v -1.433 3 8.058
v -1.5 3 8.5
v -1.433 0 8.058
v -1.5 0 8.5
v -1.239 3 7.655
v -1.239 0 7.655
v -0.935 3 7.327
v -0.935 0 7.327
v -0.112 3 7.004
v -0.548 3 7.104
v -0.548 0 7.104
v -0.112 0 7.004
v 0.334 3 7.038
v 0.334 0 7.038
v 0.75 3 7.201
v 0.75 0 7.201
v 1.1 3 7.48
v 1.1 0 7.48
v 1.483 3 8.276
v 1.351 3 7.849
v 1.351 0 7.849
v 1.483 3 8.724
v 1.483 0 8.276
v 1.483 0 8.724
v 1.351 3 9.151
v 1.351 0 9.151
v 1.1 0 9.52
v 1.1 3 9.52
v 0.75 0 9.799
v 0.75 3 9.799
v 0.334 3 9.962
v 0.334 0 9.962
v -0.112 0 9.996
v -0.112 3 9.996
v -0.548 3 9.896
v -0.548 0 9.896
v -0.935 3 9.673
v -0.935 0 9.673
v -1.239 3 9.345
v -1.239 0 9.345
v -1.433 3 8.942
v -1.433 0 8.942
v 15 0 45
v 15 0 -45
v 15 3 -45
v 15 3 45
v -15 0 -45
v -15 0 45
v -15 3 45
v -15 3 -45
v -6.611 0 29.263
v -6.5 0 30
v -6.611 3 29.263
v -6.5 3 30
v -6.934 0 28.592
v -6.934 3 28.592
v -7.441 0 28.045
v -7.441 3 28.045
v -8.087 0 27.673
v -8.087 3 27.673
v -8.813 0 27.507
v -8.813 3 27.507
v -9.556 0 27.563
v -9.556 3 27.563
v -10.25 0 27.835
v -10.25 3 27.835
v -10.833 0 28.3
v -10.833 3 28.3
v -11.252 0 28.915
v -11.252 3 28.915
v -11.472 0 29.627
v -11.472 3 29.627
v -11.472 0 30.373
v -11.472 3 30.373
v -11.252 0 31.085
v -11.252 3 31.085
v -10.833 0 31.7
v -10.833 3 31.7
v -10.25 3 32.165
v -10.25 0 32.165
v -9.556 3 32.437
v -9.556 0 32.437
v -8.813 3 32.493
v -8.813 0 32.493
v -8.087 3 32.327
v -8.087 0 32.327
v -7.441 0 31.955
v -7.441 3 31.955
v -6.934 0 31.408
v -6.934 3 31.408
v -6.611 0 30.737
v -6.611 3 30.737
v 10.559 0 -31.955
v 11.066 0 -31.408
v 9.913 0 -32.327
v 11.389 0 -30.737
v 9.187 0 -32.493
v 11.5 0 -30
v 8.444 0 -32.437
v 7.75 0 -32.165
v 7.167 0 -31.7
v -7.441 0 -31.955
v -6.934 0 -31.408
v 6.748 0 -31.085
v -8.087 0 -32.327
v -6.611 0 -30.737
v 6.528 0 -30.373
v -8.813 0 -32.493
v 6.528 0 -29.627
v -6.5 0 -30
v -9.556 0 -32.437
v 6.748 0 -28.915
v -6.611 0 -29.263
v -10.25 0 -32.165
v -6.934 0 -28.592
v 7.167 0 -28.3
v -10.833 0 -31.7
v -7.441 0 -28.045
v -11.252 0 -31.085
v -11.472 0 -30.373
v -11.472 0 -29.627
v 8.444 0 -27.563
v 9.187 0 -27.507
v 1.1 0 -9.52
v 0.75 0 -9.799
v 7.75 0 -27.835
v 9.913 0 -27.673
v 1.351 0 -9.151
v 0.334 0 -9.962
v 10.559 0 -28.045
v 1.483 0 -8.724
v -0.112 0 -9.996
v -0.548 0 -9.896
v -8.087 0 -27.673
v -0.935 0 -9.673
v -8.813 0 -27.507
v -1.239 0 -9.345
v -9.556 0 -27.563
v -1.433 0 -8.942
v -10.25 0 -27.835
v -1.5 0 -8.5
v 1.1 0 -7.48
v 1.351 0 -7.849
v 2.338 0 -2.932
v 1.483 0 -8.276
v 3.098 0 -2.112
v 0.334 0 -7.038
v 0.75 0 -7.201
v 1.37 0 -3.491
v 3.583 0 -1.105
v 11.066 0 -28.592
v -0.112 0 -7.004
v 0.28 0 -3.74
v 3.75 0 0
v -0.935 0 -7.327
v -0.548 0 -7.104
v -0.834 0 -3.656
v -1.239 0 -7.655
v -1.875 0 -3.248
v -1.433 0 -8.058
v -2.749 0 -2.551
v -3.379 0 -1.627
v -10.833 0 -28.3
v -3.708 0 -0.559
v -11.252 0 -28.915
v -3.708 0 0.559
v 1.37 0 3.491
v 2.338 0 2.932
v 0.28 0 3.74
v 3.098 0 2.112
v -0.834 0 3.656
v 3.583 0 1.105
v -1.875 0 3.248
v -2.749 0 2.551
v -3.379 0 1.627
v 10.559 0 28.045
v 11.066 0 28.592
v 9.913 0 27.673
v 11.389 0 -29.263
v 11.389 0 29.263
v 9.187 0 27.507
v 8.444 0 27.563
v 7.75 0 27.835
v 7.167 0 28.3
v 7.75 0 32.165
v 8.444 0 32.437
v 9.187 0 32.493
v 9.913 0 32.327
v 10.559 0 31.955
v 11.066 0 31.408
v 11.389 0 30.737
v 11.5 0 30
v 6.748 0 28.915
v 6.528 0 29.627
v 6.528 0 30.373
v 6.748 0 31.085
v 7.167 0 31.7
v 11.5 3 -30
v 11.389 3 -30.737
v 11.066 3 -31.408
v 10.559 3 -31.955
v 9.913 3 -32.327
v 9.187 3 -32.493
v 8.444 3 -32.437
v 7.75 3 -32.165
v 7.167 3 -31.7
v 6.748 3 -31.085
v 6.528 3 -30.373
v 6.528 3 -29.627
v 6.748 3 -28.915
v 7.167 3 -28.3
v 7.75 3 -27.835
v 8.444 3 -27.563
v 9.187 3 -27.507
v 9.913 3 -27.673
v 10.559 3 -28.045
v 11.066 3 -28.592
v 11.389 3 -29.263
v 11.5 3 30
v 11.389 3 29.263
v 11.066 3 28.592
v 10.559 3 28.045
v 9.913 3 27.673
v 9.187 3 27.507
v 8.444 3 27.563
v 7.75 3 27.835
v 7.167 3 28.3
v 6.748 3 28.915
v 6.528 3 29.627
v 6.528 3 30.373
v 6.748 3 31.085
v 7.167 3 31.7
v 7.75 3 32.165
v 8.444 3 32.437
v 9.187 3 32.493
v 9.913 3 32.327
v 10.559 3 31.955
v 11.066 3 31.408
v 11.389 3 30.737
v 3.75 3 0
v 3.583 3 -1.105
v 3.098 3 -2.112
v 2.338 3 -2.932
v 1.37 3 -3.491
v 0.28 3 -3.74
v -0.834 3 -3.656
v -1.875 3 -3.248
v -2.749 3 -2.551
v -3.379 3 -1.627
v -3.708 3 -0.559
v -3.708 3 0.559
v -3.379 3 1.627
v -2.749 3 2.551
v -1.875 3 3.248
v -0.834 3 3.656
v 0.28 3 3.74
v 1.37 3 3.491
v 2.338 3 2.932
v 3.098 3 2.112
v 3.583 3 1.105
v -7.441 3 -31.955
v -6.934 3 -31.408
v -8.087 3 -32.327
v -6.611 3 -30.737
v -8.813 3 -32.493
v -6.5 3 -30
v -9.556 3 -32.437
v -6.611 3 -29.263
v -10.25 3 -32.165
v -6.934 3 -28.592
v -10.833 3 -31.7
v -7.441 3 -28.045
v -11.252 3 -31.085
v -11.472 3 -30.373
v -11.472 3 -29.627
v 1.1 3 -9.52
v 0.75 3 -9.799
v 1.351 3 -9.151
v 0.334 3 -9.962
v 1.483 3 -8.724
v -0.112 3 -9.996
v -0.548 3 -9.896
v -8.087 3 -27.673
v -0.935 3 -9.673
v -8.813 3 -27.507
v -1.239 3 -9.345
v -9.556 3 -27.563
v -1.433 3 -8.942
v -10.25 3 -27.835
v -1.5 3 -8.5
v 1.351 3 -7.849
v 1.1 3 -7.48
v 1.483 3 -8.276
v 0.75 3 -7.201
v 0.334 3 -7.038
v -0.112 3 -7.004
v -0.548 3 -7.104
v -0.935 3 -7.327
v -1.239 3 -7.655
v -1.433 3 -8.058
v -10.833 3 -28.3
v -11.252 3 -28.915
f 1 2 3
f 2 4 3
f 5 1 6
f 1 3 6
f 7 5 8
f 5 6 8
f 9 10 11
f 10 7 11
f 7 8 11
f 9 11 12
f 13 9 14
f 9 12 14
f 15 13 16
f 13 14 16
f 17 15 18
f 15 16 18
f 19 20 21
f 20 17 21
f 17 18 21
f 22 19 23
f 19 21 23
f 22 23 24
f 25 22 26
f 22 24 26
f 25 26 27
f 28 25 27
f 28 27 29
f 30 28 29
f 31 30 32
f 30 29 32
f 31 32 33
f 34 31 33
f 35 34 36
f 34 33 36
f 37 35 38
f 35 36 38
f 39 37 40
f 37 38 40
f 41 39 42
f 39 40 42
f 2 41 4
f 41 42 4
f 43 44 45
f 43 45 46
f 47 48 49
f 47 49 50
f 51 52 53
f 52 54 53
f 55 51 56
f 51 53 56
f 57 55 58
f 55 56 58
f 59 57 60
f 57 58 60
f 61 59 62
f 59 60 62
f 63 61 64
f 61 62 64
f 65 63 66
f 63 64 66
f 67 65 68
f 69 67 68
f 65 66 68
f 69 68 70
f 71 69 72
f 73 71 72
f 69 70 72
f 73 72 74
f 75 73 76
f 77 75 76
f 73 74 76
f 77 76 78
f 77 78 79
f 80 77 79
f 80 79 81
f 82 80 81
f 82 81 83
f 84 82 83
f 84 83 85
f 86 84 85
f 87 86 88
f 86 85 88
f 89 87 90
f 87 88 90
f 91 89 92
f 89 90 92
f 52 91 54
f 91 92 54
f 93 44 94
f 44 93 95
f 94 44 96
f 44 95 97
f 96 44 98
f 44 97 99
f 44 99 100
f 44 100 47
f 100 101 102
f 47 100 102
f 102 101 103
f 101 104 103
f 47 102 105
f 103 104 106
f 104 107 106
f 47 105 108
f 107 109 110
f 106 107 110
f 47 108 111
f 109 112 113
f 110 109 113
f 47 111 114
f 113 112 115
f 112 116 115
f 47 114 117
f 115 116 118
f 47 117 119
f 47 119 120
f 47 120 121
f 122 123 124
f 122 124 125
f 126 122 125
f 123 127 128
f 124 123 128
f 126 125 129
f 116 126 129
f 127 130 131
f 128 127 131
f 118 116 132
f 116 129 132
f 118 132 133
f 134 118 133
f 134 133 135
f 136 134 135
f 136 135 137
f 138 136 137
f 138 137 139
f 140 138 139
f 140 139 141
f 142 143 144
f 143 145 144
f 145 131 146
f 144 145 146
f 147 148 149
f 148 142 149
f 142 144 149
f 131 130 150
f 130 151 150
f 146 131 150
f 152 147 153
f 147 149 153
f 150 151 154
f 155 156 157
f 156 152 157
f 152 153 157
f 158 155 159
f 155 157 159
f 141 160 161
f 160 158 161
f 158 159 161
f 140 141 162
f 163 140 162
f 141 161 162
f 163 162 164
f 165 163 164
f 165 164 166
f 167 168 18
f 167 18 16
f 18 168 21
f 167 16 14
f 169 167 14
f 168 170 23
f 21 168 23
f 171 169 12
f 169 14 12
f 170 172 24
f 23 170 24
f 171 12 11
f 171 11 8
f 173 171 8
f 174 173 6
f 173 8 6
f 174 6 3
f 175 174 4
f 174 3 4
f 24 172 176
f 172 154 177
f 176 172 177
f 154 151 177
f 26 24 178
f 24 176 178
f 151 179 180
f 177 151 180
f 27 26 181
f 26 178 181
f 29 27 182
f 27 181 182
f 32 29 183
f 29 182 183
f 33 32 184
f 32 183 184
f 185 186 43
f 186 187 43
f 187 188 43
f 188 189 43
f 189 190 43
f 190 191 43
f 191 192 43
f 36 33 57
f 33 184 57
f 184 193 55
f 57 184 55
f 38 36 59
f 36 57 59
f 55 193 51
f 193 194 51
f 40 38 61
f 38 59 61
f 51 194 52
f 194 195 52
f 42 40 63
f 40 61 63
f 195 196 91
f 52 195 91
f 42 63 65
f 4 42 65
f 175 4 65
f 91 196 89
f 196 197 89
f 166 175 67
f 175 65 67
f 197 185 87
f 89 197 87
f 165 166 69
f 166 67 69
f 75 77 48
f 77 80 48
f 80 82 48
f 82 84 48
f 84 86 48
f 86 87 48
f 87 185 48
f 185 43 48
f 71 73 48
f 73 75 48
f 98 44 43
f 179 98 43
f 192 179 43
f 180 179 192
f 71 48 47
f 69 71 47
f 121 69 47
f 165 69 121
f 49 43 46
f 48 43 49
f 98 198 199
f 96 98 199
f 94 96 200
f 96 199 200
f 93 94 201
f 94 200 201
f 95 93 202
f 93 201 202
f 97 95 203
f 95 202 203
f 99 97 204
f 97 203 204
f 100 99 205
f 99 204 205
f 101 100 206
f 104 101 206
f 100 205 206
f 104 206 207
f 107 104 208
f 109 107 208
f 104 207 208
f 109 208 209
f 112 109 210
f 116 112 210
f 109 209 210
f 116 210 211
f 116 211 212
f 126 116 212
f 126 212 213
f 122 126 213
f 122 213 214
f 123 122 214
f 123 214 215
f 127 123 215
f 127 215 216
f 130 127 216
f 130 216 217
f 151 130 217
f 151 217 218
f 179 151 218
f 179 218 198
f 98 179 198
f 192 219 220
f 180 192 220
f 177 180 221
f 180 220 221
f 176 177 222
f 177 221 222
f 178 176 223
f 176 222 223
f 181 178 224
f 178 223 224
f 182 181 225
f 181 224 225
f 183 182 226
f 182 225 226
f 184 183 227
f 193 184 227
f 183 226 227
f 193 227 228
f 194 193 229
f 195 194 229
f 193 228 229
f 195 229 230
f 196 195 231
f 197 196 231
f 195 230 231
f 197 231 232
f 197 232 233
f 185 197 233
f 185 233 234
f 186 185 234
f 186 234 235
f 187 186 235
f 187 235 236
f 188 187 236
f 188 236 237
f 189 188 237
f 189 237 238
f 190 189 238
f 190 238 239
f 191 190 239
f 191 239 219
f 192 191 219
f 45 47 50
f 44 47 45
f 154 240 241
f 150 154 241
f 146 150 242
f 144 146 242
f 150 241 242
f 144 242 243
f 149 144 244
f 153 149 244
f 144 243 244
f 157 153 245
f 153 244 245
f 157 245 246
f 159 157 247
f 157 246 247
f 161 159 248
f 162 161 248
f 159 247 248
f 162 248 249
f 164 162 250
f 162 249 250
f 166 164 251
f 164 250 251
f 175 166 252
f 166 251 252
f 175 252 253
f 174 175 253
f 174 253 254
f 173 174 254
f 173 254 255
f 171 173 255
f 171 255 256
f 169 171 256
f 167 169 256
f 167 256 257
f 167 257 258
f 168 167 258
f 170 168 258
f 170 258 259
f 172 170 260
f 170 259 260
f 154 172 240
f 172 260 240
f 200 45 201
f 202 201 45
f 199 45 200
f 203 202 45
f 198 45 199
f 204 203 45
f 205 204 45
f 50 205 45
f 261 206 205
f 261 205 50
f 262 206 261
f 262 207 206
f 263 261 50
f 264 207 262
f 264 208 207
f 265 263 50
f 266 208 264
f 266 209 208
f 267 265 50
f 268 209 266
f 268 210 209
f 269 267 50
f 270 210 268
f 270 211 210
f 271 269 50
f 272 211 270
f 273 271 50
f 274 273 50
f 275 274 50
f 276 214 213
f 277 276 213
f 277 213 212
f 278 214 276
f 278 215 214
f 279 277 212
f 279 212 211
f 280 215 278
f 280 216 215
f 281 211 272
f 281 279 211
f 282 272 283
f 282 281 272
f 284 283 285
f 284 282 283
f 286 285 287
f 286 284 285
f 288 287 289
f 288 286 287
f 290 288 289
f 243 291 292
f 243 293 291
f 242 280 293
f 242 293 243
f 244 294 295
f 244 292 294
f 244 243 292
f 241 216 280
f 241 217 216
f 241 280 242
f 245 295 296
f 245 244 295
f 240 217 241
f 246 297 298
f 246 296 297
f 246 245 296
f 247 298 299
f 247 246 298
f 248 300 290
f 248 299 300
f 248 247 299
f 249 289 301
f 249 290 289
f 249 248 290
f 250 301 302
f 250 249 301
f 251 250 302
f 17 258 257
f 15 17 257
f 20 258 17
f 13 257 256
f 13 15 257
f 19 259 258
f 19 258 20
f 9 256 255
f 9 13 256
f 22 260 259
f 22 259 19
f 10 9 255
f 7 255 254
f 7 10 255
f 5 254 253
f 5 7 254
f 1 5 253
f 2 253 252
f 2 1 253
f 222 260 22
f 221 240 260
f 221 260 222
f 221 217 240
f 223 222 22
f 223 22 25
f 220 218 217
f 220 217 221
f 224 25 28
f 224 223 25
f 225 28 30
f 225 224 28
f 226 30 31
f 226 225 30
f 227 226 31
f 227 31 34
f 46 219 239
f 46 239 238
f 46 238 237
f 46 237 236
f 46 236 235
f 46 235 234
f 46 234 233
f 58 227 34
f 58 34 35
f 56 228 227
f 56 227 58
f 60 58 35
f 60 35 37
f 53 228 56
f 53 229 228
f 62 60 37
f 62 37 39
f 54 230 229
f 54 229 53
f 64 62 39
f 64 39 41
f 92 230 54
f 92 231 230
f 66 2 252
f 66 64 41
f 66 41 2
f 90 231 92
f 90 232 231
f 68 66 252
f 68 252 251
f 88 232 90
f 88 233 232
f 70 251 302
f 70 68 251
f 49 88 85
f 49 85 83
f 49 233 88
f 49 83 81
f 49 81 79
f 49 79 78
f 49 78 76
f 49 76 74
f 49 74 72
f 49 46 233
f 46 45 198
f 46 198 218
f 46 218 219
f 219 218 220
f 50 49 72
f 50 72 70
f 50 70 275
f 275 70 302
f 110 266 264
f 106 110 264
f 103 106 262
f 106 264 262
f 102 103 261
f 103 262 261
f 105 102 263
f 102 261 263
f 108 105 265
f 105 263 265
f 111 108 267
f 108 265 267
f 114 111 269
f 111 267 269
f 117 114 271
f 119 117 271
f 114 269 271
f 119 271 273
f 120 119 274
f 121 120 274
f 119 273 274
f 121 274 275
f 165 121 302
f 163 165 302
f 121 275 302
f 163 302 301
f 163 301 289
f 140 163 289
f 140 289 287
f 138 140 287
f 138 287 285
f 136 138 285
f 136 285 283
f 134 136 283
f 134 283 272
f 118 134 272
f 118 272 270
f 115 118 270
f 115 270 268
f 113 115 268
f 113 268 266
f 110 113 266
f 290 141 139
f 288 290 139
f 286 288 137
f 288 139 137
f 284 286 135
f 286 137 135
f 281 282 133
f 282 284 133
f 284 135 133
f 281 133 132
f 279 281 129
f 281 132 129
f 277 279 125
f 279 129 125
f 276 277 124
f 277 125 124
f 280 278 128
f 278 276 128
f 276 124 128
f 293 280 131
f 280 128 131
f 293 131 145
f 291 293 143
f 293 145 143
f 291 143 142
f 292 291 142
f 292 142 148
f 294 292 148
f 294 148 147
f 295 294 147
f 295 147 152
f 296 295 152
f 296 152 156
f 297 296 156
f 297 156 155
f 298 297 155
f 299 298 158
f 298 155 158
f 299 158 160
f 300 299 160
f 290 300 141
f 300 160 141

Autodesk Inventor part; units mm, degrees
ref_plane "YZ Plane" through (0, 0, 0) normal (1, 0, 0) x (0, 1, 0)
ref_plane "XZ Plane" through (0, 0, 0) normal (0, 1, 0) x (-1, 0, 0)
ref_plane "XY Plane" through (0, 0, 0) normal (0, 0, 1) x (1, 0, 0)
sketch "スケッチ1" plane through (0, 0, 0) normal (0, 1, 0) x (-1, 0, 0)
  circle A0 centre (0, 0) radius 12.5
  line L0 (-15, -45) -> (-15, 45)
  line L1 (-15, 45) -> (15, 45)
  line L2 (15, 45) -> (15, -45)
  line L3 (15, -45) -> (-15, -45)
  line L4 (-15, -45) -> (15, 45) construction
  line L5 (-15, 45) -> (15, -45) construction
  circle A1 centre (0, -8.5) radius 1.5
  circle A2 centre (0, 8.5) radius 1.5
  dimension "d0" = 25
  dimension "d1" = 90
  dimension "d2" = 30
  dimension "d10" = 3
  dimension "d11" = 3
extrude "押し出し3" add sketch "スケッチ1" along normal blind 3 contours A0 | L0 L1 L2 L3
sketch "スケッチ3" plane through (0, 3, 0) normal (0, 1, 0) x (1, 0, 0)
  circle A0 centre (0, 0) radius 3.75
  dimension "d14" = 7.5
extrude "押し出し4" cut sketch "スケッチ3" against normal blind 3
sketch "スケッチ4" plane through (0, 3, 0) normal (0, 1, 0) x (1, 0, 0)
  line L0 (0, 0) -> (0, 30)
  line L1 (0, 30) -> (0, -30)
  line L2 (0, -30) -> (-9, -30)
  line L3 (-15, 45) -> (-15, -45) projected
  circle A0 centre (-9, -30) radius 2.5
  line L4 (0, -30) -> (9, -30)
  line L5 (9, -30) -> (-9, 30)
  line L6 (-9, -30) -> (9, 30)
  circle A1 centre (9, -30) radius 2.5
  circle A2 centre (-9, 30) radius 2.5
  circle A3 centre (9, 30) radius 2.5
  dimension "d17" = 30
  dimension "d18" = 60
  dimension "d19" = 9
  dimension "d20" = 5
  dimension "d21" = 9
  dimension "d23" = 5
  dimension "d24" = 5
  dimension "d25" = 5
extrude "押し出し5" cut sketch "スケッチ4" against normal blind 3 contours A2 | A3 | A1 L4 L5 | L5 L4 A1 | L6 L2 A0 | A0 L2 L6
properties part number "板 中心Φ7" material "アルミニウム 6061"
